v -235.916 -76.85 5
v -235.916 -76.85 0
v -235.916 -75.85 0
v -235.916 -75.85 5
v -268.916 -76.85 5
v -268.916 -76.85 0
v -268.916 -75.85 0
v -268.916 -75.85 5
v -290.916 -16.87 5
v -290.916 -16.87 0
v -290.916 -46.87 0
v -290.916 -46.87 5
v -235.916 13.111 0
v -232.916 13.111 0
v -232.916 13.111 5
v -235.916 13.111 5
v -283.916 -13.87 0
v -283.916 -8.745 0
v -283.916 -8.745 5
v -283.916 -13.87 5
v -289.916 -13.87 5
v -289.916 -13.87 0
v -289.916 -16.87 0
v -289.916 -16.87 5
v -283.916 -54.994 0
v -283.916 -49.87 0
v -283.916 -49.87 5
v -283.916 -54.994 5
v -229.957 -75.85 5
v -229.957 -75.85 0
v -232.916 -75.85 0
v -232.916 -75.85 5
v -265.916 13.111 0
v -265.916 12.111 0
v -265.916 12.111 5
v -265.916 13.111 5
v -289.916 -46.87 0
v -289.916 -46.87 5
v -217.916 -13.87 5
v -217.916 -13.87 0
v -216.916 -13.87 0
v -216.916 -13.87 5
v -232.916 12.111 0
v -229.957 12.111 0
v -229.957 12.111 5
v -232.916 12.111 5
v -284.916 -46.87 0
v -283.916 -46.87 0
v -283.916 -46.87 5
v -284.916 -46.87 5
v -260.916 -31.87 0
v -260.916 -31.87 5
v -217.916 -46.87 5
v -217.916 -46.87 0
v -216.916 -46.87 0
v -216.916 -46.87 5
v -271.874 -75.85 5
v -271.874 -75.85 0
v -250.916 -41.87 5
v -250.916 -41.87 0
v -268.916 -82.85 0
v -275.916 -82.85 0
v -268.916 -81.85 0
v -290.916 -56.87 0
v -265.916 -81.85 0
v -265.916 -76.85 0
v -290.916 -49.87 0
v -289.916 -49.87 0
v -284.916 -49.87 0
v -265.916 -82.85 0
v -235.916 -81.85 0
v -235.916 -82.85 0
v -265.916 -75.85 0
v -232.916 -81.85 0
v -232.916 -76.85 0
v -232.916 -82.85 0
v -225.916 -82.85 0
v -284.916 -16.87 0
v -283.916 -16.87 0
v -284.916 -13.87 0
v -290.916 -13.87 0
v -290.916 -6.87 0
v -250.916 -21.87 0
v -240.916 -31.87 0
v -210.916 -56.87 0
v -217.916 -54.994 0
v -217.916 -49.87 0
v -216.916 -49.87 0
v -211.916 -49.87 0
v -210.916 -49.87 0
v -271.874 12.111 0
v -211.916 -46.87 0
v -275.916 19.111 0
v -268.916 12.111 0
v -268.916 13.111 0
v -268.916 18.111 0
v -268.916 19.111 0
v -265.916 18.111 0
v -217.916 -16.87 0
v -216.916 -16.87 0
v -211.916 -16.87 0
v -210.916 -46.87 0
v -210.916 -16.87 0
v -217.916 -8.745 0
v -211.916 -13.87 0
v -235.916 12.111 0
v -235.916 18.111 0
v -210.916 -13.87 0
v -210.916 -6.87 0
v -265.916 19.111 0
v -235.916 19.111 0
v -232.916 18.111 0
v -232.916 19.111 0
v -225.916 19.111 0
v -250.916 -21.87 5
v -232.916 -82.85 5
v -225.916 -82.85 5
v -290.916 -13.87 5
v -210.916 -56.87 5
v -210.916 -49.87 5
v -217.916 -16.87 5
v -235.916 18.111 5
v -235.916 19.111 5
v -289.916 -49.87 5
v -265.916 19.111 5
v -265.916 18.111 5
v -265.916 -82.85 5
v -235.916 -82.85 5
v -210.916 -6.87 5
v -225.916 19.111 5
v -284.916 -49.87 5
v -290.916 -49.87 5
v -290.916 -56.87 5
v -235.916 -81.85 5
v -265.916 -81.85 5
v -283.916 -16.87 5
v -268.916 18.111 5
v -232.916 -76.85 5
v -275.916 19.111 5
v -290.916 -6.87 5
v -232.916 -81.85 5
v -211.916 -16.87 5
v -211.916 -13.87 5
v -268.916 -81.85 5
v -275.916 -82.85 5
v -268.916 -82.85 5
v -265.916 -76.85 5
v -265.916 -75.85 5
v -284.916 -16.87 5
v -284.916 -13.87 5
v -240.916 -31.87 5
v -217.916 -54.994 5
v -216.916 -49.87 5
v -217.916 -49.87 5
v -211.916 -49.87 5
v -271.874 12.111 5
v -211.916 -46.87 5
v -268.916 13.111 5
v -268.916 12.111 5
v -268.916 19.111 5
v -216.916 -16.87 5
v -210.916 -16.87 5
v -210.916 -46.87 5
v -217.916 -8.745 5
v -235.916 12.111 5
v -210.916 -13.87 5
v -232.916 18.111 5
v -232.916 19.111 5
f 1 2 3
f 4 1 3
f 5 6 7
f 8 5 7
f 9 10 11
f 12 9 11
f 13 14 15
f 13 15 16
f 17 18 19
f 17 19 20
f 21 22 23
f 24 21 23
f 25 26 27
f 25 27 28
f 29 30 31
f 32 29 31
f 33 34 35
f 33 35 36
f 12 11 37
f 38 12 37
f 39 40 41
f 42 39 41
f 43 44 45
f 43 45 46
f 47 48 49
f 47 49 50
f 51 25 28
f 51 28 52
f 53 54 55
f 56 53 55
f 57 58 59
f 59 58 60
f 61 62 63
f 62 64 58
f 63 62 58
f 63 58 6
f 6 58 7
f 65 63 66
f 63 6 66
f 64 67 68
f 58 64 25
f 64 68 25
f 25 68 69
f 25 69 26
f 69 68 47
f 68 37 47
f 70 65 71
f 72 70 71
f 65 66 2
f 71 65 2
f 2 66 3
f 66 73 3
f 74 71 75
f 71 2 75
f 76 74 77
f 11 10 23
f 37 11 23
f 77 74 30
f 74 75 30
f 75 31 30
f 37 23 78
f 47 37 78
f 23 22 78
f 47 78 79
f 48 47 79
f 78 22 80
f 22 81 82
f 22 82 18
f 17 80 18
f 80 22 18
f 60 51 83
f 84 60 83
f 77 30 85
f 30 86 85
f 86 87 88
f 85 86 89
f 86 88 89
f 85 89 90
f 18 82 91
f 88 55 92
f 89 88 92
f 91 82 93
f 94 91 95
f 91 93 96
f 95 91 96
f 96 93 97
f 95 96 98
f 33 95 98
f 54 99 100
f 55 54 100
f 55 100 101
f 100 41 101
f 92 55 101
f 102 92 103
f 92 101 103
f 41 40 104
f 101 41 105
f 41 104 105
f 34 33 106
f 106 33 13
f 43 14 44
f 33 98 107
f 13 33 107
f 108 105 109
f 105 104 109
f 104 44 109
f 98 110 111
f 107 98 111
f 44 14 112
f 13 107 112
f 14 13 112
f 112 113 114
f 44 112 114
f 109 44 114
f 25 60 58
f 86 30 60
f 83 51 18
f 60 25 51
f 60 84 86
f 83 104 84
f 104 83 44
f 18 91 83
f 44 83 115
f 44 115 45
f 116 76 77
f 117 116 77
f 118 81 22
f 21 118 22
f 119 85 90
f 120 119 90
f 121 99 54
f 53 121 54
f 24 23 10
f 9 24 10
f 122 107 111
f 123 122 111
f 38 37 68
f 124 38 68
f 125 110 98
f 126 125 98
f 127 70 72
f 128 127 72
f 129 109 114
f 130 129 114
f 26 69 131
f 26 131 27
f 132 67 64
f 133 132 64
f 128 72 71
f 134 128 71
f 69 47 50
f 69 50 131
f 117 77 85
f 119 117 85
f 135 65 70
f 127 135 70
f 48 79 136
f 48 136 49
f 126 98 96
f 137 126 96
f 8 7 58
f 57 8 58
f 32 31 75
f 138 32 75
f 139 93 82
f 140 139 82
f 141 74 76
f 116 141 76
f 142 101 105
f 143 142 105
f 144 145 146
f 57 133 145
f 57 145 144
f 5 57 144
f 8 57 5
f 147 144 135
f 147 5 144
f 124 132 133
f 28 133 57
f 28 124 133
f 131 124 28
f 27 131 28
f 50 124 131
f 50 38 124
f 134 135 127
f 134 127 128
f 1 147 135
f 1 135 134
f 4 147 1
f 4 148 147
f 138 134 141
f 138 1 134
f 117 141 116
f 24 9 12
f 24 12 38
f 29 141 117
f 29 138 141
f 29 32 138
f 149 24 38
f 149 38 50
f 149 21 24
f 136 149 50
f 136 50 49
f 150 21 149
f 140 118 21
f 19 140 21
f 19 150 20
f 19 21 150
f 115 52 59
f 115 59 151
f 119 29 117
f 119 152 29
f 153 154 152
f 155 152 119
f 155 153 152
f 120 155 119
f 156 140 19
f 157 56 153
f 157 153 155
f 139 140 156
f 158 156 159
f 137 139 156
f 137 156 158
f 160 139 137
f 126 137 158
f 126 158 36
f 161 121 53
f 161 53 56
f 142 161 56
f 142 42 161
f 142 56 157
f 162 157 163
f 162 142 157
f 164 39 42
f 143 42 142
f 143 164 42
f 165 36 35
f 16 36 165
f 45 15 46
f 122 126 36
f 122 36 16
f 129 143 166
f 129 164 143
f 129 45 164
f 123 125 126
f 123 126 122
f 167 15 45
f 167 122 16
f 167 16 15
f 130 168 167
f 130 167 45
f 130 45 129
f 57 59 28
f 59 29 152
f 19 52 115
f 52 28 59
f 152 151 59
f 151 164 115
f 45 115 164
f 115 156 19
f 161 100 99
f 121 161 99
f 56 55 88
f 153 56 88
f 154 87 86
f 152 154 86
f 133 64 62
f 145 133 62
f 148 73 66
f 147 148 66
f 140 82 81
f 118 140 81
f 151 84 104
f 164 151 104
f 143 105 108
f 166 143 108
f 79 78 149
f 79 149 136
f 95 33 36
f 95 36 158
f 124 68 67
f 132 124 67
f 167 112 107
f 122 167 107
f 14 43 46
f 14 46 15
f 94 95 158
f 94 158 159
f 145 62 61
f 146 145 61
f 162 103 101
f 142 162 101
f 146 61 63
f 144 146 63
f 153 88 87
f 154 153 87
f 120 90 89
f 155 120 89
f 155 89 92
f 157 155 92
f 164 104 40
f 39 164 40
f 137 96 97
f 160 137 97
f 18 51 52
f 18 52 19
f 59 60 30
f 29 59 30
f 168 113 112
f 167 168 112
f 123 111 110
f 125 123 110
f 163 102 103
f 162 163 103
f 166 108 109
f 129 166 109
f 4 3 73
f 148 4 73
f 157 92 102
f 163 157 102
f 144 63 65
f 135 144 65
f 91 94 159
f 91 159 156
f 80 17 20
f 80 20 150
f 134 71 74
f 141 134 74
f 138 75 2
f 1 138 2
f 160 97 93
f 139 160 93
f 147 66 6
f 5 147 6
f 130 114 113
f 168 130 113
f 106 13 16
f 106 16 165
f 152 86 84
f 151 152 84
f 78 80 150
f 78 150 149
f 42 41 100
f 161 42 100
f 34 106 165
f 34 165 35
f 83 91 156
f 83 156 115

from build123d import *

# Parameters (mm, degrees)
BOSS_EXTRU_4_DEPTH = 5


with BuildPart() as part:
    # Esquisse1 → Boss.-Extru.4 (new body)
    with BuildSketch(Plane.XY):
        Polygon((-275.915909498, -82.850341845), (-268.915909498, -82.850341845), (-268.915909498, -81.850341845), (-265.915909498, -81.850341845), (-265.915909498, -82.850341845), (-235.915909498, -82.850341845), (-235.915909498, -81.850341845), (-232.915909498, -81.850341845), (-232.915909498, -82.850341845), (-225.915909498, -82.850341845), (-210.915909498, -56.869579731), (-210.915909498, -49.869579731), (-211.915909498, -49.869579731), (-211.915909498, -46.869579731), (-210.915909498, -46.869579731), (-210.915909498, -16.869579731), (-211.915909498, -16.869579731), (-211.915909498, -13.869579731), (-210.915909498, -13.869579731), (-210.915909498, -6.869579731), (-225.915909498, 19.111182382), (-232.915909498, 19.111182382), (-232.915909498, 18.111182382), (-235.915909498, 18.111182382), (-235.915909498, 19.111182382), (-265.915909498, 19.111182382), (-265.915909498, 18.111182382), (-268.915909498, 18.111182382), (-268.915909498, 19.111182382), (-275.915909498, 19.111182382), (-290.915909498, -6.869579731), (-290.915909498, -13.869579731), (-289.915909498, -13.869579731), (-289.915909498, -16.869579731), (-290.915909498, -16.869579731), (-290.915909498, -46.869579731), (-289.915909498, -46.869579731), (-289.915909498, -49.869579731), (-290.915909498, -49.869579731), (-290.915909498, -56.869579731), align=None)
        Polygon((-283.915909498, -49.869579731), (-283.915909498, -54.993935384), (-260.915909498, -31.869817618), (-283.915909498, -8.745224078), (-283.915909498, -13.869579731), (-284.915909498, -13.869579731), (-284.915909498, -16.869579731), (-283.915909498, -16.869579731), (-283.915909498, -46.869579731), (-284.915909498, -46.869579731), (-284.915909498, -49.869579731), align=None, mode=Mode.SUBTRACT)
        Polygon((-268.915909498, 12.111182382), (-271.874457613, 12.111182382), (-250.915909498, -21.869817618), (-229.957361382, 12.111182382), (-232.915909498, 12.111182382), (-232.915909498, 13.111182382), (-235.915909498, 13.111182382), (-235.915909498, 12.111182382), (-265.915909498, 12.111182382), (-265.915909498, 13.111182382), (-268.915909498, 13.111182382), align=None, mode=Mode.SUBTRACT)
        Polygon((-271.874457613, -75.850341845), (-250.915909498, -41.869817618), (-229.957361382, -75.850341845), (-232.915909498, -75.850341845), (-232.915909498, -76.850341845), (-235.915909498, -76.850341845), (-235.915909498, -75.850341845), (-265.915909498, -75.850341845), (-265.915909498, -76.850341845), (-268.915909498, -76.850341845), (-268.915909498, -75.850341845), align=None, mode=Mode.SUBTRACT)
        Polygon((-217.915909498, -54.993935384), (-240.915909498, -31.869817618), (-217.915909498, -8.745224078), (-217.915909498, -13.869579731), (-216.915909498, -13.869579731), (-216.915909498, -16.869579731), (-217.915909498, -16.869579731), (-217.915909498, -46.869579731), (-216.915909498, -46.869579731), (-216.915909498, -49.869579731), (-217.915909498, -49.869579731), align=None, mode=Mode.SUBTRACT)
    extrude(amount=BOSS_EXTRU_4_DEPTH)


solid = part.part
